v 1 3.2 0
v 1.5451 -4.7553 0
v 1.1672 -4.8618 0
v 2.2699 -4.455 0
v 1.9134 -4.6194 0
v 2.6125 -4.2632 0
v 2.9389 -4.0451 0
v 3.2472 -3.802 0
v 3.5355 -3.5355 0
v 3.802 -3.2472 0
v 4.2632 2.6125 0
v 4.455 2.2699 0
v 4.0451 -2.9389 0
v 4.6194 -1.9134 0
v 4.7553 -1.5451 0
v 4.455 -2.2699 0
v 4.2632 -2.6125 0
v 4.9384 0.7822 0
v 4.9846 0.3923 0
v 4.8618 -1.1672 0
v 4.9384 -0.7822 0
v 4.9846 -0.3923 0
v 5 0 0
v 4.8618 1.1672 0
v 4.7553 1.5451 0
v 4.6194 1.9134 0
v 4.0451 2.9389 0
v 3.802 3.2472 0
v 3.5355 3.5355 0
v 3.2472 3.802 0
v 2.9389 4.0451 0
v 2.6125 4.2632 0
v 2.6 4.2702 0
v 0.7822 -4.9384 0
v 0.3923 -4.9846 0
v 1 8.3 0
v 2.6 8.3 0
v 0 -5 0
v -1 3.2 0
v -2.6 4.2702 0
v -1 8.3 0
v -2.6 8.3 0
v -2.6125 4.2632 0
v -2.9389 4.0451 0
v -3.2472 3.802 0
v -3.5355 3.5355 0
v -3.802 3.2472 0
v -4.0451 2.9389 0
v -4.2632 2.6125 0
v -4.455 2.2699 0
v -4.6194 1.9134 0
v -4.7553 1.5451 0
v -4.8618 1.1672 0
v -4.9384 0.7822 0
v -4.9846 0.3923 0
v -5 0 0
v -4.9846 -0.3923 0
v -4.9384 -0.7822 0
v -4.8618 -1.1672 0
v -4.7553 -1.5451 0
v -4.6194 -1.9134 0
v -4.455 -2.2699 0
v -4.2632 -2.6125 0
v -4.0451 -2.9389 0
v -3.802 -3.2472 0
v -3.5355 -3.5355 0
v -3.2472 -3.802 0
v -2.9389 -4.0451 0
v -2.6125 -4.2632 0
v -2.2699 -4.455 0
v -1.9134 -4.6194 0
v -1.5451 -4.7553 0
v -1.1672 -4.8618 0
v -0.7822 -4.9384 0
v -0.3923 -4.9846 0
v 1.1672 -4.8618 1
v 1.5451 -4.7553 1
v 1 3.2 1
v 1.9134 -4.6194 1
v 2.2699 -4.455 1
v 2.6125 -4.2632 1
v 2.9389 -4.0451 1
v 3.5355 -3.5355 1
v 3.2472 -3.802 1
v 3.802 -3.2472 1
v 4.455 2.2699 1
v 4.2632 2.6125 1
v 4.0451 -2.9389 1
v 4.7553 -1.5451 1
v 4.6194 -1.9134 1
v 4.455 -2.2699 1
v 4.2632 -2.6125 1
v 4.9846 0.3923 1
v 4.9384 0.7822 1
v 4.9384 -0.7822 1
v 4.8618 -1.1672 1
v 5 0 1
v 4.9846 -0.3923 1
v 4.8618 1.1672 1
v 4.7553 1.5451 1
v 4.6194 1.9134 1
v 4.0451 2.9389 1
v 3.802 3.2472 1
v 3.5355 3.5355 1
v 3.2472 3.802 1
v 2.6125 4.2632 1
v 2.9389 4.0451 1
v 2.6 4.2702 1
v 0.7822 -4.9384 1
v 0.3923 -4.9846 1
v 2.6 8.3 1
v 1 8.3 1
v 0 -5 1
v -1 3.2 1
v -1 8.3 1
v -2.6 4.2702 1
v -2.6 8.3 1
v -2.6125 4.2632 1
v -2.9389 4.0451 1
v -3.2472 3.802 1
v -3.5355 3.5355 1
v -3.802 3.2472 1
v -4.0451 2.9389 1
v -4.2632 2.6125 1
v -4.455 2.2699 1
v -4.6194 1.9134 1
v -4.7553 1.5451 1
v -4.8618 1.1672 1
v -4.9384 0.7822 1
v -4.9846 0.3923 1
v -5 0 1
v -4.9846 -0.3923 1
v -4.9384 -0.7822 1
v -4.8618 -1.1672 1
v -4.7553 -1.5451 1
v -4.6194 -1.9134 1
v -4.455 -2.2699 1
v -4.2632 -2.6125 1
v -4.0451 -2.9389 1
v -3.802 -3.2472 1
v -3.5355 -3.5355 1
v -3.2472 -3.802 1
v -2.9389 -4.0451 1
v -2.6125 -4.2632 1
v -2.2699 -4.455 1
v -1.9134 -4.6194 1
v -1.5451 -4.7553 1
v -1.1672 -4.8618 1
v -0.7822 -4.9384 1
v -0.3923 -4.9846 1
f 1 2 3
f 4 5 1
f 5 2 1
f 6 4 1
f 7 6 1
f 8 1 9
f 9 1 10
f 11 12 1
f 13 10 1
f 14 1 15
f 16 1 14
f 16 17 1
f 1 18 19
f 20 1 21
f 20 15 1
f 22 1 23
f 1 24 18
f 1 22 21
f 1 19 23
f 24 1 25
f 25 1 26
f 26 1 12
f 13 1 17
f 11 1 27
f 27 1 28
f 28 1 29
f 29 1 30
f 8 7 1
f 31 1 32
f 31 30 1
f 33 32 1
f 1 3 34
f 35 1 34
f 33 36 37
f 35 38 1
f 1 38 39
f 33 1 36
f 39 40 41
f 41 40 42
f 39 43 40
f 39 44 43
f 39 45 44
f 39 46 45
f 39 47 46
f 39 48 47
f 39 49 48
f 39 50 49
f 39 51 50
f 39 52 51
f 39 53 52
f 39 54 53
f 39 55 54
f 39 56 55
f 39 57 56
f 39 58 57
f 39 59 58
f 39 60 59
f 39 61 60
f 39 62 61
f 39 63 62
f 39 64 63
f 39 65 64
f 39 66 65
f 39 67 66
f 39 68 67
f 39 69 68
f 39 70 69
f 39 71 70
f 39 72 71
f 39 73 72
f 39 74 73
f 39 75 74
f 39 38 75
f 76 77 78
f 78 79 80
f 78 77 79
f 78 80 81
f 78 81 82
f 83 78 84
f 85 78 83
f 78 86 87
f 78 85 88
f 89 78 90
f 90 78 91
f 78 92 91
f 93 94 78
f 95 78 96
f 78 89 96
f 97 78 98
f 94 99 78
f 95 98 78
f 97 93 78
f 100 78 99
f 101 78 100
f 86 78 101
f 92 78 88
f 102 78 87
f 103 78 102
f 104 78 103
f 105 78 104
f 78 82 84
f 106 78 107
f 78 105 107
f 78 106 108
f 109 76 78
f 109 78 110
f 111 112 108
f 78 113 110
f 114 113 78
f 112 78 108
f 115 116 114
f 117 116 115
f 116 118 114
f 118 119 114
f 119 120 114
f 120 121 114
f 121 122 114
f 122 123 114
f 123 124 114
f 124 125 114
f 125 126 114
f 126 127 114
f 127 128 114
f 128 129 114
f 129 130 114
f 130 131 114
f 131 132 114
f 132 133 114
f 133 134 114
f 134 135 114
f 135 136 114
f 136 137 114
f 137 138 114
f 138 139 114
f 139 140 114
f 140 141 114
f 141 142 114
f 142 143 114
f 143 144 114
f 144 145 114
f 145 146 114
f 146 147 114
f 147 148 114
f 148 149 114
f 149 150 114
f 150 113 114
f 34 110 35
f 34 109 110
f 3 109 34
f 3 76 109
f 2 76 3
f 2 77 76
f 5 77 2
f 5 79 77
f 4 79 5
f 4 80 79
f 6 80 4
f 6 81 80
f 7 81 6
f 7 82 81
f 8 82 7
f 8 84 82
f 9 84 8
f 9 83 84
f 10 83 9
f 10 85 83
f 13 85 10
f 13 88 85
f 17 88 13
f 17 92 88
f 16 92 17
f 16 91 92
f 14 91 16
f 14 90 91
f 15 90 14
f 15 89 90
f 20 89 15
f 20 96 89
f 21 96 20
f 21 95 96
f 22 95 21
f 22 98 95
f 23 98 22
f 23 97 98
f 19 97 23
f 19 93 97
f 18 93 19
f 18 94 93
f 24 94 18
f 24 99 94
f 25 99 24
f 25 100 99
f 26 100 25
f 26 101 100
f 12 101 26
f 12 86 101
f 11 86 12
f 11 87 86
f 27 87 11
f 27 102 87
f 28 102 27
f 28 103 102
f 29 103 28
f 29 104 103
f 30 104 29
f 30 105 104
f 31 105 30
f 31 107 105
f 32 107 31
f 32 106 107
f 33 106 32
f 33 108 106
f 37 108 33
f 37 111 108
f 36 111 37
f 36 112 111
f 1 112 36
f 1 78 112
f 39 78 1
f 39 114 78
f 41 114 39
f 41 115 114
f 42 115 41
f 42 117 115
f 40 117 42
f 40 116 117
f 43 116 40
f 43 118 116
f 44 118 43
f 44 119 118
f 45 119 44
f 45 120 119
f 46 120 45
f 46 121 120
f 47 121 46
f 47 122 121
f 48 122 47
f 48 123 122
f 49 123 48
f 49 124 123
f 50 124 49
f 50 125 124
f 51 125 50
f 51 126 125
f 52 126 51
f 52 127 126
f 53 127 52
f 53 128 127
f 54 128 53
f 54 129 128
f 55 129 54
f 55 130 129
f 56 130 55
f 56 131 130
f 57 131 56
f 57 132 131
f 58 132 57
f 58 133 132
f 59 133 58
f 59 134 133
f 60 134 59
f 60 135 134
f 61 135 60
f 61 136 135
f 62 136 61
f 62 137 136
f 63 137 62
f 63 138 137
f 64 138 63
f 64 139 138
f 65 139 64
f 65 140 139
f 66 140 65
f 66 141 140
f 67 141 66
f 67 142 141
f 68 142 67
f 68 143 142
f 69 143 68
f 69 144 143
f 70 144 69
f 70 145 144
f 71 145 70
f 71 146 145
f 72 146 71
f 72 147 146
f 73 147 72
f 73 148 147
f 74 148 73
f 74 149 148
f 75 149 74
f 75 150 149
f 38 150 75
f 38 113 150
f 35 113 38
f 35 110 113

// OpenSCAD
// part_id: cp-f2
// name: Fork 2W 4D 6L 7T
// source_drawing_ids: DRW-005
// units: mm
// revision: 0.1
// SPDX-License-Identifier: MIT

module cpf2_profile_2d() {
    difference() {
        union() {
            circle(r = 5.0, $fn = 80);
            translate([0, 4.8]) square([5.2, 7.0], center = true);
        }
        translate([0, 6.7]) square([2.0, 7.0], center = true);
    }
}

module part_cpf2(th = 1.0) {
    linear_extrude(height = th) cpf2_profile_2d();
}

// ---- "main guard" ----
// Default to previewing when opened directly:
if (is_undef(__LIB_MODE__)) {
    part_cpf2();
}
